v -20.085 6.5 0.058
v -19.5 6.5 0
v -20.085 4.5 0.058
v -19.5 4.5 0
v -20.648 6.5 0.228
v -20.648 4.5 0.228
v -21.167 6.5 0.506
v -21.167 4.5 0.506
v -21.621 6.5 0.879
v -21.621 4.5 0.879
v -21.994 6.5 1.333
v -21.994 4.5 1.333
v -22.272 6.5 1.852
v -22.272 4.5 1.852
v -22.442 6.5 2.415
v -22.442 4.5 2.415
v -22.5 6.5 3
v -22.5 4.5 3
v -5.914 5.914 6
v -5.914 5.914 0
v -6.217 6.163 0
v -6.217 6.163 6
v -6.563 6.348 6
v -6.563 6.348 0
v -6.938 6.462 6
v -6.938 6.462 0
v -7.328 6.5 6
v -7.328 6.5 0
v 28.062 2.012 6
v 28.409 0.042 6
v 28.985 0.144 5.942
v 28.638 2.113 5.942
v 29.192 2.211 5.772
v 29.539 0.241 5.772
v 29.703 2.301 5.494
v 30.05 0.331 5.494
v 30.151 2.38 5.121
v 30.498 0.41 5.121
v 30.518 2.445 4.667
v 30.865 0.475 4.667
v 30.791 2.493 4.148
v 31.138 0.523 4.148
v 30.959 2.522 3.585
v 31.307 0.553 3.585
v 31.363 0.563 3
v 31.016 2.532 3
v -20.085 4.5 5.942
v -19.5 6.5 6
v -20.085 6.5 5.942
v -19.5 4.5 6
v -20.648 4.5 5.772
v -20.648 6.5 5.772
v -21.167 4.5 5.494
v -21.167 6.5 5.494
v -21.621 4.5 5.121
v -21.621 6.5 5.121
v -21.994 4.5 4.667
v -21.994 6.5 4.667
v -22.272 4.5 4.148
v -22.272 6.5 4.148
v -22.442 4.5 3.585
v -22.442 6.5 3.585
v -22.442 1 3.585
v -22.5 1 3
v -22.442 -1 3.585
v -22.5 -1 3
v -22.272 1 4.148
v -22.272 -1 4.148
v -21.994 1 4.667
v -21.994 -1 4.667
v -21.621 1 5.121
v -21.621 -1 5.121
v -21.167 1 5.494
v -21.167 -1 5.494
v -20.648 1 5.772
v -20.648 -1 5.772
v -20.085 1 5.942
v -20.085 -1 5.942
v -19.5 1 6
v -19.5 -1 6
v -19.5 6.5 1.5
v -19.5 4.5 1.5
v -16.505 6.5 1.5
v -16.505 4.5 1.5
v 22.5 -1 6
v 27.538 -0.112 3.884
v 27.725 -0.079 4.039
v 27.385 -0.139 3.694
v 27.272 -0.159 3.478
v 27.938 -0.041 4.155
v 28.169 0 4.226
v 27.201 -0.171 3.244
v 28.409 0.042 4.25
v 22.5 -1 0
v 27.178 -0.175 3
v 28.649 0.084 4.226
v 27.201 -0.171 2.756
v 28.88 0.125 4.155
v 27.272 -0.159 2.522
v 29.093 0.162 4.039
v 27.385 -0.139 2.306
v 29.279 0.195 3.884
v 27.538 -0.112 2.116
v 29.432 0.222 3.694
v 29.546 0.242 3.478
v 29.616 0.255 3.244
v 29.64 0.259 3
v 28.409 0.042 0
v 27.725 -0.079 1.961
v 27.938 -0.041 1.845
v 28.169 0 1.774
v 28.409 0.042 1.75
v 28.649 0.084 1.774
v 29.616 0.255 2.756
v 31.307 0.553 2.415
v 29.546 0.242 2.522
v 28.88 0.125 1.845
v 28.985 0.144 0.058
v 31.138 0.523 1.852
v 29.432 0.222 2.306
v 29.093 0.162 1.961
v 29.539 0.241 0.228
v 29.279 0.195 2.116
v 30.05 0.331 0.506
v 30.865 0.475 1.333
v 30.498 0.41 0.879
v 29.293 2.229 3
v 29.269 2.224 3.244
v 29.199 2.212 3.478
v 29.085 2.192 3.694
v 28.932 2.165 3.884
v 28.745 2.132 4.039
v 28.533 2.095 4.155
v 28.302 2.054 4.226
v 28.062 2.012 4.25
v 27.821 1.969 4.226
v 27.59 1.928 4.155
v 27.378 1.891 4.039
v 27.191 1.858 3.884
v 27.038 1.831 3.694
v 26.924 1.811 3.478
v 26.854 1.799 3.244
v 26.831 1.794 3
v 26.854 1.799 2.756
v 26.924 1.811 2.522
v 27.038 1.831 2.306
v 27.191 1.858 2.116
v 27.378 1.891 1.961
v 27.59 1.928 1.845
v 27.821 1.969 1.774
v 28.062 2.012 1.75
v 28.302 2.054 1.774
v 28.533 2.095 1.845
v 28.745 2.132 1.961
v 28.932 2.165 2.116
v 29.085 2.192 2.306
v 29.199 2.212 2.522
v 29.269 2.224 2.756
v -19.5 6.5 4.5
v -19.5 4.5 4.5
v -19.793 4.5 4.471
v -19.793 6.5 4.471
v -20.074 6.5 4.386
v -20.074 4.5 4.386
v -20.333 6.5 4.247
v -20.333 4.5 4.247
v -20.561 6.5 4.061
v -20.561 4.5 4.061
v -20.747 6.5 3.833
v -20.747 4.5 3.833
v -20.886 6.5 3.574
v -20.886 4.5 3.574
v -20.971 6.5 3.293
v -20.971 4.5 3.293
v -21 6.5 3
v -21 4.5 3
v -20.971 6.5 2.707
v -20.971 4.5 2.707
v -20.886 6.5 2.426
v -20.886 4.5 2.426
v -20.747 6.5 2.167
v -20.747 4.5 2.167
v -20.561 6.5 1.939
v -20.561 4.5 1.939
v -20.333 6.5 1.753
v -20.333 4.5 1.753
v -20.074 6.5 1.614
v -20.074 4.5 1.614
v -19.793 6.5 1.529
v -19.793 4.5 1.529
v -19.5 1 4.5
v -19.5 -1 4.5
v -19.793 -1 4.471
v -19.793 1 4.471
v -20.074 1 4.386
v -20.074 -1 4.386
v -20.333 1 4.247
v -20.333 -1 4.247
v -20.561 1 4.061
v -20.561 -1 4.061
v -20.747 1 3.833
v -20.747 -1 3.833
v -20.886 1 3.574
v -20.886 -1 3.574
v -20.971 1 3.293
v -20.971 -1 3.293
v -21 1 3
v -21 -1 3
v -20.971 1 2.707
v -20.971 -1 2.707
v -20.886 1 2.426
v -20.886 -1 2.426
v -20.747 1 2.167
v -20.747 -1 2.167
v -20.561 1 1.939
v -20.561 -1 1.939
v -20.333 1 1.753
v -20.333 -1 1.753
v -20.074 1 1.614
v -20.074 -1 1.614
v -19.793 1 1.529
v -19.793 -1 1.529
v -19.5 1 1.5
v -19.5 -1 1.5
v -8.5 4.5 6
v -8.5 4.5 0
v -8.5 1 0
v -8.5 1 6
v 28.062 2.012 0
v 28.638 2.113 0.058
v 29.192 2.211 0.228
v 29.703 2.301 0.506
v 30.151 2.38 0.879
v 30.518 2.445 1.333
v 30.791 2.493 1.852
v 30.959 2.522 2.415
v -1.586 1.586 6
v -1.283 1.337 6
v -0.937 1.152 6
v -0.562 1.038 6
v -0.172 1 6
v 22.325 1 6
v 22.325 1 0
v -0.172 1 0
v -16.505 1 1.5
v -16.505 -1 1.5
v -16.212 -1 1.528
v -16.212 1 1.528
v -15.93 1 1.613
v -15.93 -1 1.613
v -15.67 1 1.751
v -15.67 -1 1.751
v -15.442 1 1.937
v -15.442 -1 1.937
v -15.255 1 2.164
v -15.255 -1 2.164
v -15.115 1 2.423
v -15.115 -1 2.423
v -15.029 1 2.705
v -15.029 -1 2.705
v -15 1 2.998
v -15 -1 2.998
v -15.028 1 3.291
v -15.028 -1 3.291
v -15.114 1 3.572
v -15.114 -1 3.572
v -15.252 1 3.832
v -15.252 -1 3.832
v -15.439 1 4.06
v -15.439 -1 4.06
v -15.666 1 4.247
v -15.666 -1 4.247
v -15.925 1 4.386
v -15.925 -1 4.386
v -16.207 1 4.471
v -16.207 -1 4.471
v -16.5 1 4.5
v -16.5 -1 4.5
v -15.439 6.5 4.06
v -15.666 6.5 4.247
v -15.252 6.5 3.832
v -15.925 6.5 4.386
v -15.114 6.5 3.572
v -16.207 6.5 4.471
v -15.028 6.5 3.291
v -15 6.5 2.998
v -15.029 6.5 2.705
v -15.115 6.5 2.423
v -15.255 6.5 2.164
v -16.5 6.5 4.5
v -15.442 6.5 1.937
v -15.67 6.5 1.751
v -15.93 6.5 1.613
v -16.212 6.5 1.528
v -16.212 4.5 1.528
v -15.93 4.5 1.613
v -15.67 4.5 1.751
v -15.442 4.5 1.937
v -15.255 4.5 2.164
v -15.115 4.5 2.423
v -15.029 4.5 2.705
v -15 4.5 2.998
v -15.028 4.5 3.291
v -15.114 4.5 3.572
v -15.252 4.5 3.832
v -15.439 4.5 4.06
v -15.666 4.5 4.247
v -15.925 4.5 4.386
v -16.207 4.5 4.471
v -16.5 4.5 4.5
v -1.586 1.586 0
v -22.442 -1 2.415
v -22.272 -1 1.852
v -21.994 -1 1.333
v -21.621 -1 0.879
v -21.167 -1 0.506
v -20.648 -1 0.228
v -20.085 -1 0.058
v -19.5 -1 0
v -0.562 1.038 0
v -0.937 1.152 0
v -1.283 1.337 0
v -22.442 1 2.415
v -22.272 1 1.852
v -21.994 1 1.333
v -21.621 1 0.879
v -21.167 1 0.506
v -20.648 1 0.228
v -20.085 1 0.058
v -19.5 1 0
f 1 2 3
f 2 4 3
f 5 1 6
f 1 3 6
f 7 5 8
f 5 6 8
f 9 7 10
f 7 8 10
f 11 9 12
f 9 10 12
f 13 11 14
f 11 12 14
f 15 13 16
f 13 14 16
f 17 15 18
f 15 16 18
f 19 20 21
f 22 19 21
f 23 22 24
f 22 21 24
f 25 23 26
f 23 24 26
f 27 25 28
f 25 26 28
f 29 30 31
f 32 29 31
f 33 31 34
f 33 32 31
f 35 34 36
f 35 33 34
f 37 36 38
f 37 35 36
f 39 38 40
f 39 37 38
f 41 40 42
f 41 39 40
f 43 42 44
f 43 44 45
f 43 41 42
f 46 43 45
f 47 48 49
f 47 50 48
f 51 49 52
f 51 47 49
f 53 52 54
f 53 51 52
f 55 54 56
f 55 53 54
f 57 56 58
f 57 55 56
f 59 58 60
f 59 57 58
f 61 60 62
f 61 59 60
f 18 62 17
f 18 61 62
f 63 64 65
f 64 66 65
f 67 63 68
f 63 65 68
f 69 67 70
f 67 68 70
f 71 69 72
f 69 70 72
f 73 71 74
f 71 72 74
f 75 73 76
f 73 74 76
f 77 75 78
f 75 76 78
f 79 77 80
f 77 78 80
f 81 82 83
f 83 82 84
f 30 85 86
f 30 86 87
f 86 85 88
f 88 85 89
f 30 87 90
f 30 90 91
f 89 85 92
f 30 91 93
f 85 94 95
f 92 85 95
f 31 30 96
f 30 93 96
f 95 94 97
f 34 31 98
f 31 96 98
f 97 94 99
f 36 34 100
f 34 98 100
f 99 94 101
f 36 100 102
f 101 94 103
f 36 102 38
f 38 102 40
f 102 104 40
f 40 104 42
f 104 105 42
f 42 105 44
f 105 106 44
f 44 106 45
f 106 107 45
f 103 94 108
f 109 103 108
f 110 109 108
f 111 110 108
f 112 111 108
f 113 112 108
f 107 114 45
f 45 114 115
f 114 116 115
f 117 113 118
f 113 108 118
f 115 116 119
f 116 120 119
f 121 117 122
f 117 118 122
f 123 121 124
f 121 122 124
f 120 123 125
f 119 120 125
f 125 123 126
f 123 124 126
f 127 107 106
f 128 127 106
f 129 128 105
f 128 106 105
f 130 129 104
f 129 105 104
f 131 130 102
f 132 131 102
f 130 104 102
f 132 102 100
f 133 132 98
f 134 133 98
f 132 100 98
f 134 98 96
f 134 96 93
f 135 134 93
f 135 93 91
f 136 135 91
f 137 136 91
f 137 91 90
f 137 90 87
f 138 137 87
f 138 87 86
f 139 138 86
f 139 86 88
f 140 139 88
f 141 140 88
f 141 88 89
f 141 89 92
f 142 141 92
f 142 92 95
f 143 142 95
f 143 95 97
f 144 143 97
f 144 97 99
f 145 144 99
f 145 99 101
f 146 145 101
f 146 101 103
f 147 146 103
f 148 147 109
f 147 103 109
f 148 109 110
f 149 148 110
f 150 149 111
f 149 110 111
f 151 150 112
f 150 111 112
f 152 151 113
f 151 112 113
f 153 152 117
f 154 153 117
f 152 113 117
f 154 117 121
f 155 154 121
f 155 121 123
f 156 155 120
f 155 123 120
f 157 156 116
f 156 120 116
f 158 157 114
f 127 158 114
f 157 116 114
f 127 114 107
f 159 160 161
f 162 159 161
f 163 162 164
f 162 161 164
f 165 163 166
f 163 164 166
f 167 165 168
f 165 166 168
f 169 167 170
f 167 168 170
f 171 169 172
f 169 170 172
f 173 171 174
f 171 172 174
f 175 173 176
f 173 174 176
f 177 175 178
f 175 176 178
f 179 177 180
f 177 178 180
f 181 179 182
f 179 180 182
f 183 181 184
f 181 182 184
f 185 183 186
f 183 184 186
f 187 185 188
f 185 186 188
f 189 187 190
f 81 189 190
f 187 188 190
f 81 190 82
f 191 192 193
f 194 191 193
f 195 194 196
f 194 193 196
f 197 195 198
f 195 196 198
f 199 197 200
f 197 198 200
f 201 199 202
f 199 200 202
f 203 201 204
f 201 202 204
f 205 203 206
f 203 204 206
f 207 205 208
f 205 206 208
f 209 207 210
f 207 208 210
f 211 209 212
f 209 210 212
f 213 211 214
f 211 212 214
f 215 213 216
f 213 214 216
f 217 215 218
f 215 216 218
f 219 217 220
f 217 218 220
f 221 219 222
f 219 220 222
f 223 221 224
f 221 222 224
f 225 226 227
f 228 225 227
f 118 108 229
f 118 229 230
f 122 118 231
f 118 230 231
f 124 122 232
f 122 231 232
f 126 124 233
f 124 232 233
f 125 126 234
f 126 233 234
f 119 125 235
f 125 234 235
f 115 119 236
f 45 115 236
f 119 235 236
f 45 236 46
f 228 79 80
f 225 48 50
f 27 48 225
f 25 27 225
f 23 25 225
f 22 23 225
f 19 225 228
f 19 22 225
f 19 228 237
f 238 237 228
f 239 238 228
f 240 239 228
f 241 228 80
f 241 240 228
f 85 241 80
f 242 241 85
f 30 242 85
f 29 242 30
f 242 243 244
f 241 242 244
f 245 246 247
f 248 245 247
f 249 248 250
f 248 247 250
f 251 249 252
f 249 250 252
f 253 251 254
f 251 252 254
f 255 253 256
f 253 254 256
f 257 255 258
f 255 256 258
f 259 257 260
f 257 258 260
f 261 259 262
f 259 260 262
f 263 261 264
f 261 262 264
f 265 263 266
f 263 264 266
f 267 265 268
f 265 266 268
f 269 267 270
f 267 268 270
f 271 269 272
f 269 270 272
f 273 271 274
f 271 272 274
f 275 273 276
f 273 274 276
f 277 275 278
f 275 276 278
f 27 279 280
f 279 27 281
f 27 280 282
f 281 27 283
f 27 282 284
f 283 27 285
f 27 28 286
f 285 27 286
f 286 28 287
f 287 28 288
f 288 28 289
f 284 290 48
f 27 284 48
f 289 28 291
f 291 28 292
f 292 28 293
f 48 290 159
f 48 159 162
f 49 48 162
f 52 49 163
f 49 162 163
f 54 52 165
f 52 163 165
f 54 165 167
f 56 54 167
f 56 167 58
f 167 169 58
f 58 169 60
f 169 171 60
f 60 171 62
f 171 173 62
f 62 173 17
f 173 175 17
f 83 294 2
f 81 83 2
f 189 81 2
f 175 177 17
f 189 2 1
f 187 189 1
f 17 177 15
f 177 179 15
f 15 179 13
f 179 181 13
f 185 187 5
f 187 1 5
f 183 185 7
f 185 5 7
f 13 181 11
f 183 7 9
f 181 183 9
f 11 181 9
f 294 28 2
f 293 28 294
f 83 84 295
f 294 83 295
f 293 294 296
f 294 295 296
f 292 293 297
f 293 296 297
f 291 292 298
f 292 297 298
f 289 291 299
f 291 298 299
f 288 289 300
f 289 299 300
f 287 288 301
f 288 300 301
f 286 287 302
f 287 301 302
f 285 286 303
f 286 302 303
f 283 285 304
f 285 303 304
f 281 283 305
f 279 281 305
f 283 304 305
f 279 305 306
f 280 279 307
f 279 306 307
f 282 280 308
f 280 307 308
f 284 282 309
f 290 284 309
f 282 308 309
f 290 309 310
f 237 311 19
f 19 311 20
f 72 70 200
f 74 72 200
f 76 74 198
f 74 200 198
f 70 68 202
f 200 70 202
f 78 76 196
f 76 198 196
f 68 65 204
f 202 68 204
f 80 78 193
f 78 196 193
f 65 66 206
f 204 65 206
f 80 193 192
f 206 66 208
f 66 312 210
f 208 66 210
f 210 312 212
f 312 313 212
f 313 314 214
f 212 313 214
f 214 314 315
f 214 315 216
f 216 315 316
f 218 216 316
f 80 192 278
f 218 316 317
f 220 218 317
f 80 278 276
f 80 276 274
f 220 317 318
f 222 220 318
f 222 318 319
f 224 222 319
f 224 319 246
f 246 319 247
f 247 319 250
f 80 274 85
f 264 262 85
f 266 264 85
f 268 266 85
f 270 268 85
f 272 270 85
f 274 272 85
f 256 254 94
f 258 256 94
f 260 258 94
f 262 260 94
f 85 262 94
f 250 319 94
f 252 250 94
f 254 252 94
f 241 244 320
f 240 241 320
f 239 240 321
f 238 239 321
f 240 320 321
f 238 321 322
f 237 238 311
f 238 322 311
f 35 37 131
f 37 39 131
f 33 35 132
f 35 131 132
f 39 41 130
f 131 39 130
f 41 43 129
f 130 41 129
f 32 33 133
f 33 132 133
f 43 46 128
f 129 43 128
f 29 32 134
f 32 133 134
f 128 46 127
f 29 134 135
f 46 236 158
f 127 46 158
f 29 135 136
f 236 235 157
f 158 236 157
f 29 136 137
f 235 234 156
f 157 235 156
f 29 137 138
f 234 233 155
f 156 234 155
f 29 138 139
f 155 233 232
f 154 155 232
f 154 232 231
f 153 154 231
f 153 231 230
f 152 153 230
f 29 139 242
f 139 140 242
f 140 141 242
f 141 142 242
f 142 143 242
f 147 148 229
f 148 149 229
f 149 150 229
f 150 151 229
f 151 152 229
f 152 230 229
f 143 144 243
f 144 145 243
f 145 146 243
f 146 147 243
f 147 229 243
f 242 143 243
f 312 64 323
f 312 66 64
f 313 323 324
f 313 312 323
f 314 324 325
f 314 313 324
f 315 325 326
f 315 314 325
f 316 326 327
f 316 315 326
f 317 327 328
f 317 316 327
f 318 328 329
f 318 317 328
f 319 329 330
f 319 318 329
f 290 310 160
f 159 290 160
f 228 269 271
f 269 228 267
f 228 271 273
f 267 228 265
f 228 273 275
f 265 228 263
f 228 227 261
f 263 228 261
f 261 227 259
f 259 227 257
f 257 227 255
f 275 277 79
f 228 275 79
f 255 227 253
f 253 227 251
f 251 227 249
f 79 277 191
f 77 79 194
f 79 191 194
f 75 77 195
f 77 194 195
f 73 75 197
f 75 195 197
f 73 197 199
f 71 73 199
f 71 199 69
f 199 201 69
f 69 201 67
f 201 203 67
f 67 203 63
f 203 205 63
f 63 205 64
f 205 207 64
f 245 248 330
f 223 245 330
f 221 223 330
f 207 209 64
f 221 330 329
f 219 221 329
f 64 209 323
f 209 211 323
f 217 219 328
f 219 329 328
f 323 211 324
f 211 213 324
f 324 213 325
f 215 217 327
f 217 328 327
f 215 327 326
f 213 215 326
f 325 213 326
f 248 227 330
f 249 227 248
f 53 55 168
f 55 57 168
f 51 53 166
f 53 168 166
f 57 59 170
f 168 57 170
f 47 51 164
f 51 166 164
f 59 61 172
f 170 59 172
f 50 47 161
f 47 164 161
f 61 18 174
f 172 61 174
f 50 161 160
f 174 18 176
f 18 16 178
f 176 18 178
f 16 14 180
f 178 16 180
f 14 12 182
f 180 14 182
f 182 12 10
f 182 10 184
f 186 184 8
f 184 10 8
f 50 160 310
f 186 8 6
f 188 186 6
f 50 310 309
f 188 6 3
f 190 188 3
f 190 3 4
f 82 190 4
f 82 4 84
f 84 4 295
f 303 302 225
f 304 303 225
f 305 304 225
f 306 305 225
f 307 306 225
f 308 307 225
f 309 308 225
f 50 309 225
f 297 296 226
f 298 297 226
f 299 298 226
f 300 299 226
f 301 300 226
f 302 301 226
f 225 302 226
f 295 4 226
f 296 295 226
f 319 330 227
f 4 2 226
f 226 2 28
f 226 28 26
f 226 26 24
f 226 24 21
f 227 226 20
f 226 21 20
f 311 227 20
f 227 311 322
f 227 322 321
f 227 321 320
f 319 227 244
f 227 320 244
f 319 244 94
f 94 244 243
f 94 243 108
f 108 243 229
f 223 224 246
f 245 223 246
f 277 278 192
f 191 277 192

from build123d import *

# Parameters (mm, degrees)
F1_DEPTH = 6
F3_DEPTH = 25
F4_R     = 2.99999
F5_R     = 1.25
F6_DEPTH = 25
F7_R     = 2.99999


# Not quite as in the source:
# - a fillet or chamfer is up to 0.001 mm smaller than in the source, because OpenCascade refuses the exact size


with BuildPart() as f1:
    # F0 (on Top) → F1 (new body)
    with BuildSketch(Plane.XY):
        with BuildLine():
            Line((-22.5, -1), (22.5, -1))
            Line((22.5, -1), (31.3632697771, 0.562833599))
            Line((31.3632697771, 0.562833599), (31.0159734218, 2.532449105))
            Line((31.0159734218, 2.532449105), (22.3250226729, 1))
            Line((22.3250226729, 1), (-0.1715728753, 1))
            ThreePointArc((-0.1715728753, 1), (-0.93693974, 1.152240935), (-1.5857864376, 1.5857864376))
            Line((-1.5857864376, 1.5857864376), (-5.9142135624, 5.9142135624))
            ThreePointArc((-5.9142135624, 5.9142135624), (-6.56306026, 6.347759065), (-7.3284271247, 6.5))
            Line((-7.3284271247, 6.5), (-22.5, 6.5))
            Line((-22.5, 6.5), (-22.5, 4.5))
            Line((-22.5, 4.5), (-8.5, 4.5))
            Line((-8.5, 4.5), (-8.5, 1))
            Line((-8.5, 1), (-22.5, 1))
            Line((-22.5, 1), (-22.5, -1))
        make_face()
    extrude(amount=F1_DEPTH)

    # F2 (on face) → F3 (cut)
    with BuildSketch(Plane.XZ.offset(1)):
        with BuildLine():
            Line((-16.5, 4.5), (-19.5, 4.5))
            ThreePointArc((-19.5, 4.5), (-21, 2.999998177), (-19.499996354, 1.5))
            Line((-19.499996354, 1.5), (-16.5046735253, 1.5000072806))
            ThreePointArc((-16.5046735253, 1.5000072806), (-15.0000018202, 2.9976632345), (-16.5, 4.5))
        make_face()
    extrude(amount=-F3_DEPTH, mode=Mode.SUBTRACT)

    # F4 (radius 3 in the source; OpenCascade refuses exactly that, so slightly less here)
    f4_edges = [f1.edges().sort_by_distance(p)[0] for p in [
        (-22.5, 5.5, 6),
        (-22.5, 0, 6),
        (-22.5, 5.5, 0),
        (-22.5, 0, 0),
    ]]
    fillet(f4_edges, radius=F4_R)

    # F5 (on face) → F6 (cut)
    with BuildSketch(Plane(origin=(0.8494680878, -4.8175729228, 0), x_dir=(0.984807753, 0.1736481777, 0), z_dir=(0.1736481777, -0.984807753, 0))):
        with Locations((27.9845262651, 3)):
            Circle(F5_R)
    extrude(amount=-F6_DEPTH, mode=Mode.SUBTRACT)

    # F7 (radius 3 in the source; OpenCascade refuses exactly that, so slightly less here)
    f7_edges = [f1.edges().sort_by_distance(p)[0] for p in [
        (31.189622, 1.547641, 6),
        (31.189622, 1.547641, 0),
    ]]
    fillet(f7_edges, radius=F7_R)


solid = f1.part
